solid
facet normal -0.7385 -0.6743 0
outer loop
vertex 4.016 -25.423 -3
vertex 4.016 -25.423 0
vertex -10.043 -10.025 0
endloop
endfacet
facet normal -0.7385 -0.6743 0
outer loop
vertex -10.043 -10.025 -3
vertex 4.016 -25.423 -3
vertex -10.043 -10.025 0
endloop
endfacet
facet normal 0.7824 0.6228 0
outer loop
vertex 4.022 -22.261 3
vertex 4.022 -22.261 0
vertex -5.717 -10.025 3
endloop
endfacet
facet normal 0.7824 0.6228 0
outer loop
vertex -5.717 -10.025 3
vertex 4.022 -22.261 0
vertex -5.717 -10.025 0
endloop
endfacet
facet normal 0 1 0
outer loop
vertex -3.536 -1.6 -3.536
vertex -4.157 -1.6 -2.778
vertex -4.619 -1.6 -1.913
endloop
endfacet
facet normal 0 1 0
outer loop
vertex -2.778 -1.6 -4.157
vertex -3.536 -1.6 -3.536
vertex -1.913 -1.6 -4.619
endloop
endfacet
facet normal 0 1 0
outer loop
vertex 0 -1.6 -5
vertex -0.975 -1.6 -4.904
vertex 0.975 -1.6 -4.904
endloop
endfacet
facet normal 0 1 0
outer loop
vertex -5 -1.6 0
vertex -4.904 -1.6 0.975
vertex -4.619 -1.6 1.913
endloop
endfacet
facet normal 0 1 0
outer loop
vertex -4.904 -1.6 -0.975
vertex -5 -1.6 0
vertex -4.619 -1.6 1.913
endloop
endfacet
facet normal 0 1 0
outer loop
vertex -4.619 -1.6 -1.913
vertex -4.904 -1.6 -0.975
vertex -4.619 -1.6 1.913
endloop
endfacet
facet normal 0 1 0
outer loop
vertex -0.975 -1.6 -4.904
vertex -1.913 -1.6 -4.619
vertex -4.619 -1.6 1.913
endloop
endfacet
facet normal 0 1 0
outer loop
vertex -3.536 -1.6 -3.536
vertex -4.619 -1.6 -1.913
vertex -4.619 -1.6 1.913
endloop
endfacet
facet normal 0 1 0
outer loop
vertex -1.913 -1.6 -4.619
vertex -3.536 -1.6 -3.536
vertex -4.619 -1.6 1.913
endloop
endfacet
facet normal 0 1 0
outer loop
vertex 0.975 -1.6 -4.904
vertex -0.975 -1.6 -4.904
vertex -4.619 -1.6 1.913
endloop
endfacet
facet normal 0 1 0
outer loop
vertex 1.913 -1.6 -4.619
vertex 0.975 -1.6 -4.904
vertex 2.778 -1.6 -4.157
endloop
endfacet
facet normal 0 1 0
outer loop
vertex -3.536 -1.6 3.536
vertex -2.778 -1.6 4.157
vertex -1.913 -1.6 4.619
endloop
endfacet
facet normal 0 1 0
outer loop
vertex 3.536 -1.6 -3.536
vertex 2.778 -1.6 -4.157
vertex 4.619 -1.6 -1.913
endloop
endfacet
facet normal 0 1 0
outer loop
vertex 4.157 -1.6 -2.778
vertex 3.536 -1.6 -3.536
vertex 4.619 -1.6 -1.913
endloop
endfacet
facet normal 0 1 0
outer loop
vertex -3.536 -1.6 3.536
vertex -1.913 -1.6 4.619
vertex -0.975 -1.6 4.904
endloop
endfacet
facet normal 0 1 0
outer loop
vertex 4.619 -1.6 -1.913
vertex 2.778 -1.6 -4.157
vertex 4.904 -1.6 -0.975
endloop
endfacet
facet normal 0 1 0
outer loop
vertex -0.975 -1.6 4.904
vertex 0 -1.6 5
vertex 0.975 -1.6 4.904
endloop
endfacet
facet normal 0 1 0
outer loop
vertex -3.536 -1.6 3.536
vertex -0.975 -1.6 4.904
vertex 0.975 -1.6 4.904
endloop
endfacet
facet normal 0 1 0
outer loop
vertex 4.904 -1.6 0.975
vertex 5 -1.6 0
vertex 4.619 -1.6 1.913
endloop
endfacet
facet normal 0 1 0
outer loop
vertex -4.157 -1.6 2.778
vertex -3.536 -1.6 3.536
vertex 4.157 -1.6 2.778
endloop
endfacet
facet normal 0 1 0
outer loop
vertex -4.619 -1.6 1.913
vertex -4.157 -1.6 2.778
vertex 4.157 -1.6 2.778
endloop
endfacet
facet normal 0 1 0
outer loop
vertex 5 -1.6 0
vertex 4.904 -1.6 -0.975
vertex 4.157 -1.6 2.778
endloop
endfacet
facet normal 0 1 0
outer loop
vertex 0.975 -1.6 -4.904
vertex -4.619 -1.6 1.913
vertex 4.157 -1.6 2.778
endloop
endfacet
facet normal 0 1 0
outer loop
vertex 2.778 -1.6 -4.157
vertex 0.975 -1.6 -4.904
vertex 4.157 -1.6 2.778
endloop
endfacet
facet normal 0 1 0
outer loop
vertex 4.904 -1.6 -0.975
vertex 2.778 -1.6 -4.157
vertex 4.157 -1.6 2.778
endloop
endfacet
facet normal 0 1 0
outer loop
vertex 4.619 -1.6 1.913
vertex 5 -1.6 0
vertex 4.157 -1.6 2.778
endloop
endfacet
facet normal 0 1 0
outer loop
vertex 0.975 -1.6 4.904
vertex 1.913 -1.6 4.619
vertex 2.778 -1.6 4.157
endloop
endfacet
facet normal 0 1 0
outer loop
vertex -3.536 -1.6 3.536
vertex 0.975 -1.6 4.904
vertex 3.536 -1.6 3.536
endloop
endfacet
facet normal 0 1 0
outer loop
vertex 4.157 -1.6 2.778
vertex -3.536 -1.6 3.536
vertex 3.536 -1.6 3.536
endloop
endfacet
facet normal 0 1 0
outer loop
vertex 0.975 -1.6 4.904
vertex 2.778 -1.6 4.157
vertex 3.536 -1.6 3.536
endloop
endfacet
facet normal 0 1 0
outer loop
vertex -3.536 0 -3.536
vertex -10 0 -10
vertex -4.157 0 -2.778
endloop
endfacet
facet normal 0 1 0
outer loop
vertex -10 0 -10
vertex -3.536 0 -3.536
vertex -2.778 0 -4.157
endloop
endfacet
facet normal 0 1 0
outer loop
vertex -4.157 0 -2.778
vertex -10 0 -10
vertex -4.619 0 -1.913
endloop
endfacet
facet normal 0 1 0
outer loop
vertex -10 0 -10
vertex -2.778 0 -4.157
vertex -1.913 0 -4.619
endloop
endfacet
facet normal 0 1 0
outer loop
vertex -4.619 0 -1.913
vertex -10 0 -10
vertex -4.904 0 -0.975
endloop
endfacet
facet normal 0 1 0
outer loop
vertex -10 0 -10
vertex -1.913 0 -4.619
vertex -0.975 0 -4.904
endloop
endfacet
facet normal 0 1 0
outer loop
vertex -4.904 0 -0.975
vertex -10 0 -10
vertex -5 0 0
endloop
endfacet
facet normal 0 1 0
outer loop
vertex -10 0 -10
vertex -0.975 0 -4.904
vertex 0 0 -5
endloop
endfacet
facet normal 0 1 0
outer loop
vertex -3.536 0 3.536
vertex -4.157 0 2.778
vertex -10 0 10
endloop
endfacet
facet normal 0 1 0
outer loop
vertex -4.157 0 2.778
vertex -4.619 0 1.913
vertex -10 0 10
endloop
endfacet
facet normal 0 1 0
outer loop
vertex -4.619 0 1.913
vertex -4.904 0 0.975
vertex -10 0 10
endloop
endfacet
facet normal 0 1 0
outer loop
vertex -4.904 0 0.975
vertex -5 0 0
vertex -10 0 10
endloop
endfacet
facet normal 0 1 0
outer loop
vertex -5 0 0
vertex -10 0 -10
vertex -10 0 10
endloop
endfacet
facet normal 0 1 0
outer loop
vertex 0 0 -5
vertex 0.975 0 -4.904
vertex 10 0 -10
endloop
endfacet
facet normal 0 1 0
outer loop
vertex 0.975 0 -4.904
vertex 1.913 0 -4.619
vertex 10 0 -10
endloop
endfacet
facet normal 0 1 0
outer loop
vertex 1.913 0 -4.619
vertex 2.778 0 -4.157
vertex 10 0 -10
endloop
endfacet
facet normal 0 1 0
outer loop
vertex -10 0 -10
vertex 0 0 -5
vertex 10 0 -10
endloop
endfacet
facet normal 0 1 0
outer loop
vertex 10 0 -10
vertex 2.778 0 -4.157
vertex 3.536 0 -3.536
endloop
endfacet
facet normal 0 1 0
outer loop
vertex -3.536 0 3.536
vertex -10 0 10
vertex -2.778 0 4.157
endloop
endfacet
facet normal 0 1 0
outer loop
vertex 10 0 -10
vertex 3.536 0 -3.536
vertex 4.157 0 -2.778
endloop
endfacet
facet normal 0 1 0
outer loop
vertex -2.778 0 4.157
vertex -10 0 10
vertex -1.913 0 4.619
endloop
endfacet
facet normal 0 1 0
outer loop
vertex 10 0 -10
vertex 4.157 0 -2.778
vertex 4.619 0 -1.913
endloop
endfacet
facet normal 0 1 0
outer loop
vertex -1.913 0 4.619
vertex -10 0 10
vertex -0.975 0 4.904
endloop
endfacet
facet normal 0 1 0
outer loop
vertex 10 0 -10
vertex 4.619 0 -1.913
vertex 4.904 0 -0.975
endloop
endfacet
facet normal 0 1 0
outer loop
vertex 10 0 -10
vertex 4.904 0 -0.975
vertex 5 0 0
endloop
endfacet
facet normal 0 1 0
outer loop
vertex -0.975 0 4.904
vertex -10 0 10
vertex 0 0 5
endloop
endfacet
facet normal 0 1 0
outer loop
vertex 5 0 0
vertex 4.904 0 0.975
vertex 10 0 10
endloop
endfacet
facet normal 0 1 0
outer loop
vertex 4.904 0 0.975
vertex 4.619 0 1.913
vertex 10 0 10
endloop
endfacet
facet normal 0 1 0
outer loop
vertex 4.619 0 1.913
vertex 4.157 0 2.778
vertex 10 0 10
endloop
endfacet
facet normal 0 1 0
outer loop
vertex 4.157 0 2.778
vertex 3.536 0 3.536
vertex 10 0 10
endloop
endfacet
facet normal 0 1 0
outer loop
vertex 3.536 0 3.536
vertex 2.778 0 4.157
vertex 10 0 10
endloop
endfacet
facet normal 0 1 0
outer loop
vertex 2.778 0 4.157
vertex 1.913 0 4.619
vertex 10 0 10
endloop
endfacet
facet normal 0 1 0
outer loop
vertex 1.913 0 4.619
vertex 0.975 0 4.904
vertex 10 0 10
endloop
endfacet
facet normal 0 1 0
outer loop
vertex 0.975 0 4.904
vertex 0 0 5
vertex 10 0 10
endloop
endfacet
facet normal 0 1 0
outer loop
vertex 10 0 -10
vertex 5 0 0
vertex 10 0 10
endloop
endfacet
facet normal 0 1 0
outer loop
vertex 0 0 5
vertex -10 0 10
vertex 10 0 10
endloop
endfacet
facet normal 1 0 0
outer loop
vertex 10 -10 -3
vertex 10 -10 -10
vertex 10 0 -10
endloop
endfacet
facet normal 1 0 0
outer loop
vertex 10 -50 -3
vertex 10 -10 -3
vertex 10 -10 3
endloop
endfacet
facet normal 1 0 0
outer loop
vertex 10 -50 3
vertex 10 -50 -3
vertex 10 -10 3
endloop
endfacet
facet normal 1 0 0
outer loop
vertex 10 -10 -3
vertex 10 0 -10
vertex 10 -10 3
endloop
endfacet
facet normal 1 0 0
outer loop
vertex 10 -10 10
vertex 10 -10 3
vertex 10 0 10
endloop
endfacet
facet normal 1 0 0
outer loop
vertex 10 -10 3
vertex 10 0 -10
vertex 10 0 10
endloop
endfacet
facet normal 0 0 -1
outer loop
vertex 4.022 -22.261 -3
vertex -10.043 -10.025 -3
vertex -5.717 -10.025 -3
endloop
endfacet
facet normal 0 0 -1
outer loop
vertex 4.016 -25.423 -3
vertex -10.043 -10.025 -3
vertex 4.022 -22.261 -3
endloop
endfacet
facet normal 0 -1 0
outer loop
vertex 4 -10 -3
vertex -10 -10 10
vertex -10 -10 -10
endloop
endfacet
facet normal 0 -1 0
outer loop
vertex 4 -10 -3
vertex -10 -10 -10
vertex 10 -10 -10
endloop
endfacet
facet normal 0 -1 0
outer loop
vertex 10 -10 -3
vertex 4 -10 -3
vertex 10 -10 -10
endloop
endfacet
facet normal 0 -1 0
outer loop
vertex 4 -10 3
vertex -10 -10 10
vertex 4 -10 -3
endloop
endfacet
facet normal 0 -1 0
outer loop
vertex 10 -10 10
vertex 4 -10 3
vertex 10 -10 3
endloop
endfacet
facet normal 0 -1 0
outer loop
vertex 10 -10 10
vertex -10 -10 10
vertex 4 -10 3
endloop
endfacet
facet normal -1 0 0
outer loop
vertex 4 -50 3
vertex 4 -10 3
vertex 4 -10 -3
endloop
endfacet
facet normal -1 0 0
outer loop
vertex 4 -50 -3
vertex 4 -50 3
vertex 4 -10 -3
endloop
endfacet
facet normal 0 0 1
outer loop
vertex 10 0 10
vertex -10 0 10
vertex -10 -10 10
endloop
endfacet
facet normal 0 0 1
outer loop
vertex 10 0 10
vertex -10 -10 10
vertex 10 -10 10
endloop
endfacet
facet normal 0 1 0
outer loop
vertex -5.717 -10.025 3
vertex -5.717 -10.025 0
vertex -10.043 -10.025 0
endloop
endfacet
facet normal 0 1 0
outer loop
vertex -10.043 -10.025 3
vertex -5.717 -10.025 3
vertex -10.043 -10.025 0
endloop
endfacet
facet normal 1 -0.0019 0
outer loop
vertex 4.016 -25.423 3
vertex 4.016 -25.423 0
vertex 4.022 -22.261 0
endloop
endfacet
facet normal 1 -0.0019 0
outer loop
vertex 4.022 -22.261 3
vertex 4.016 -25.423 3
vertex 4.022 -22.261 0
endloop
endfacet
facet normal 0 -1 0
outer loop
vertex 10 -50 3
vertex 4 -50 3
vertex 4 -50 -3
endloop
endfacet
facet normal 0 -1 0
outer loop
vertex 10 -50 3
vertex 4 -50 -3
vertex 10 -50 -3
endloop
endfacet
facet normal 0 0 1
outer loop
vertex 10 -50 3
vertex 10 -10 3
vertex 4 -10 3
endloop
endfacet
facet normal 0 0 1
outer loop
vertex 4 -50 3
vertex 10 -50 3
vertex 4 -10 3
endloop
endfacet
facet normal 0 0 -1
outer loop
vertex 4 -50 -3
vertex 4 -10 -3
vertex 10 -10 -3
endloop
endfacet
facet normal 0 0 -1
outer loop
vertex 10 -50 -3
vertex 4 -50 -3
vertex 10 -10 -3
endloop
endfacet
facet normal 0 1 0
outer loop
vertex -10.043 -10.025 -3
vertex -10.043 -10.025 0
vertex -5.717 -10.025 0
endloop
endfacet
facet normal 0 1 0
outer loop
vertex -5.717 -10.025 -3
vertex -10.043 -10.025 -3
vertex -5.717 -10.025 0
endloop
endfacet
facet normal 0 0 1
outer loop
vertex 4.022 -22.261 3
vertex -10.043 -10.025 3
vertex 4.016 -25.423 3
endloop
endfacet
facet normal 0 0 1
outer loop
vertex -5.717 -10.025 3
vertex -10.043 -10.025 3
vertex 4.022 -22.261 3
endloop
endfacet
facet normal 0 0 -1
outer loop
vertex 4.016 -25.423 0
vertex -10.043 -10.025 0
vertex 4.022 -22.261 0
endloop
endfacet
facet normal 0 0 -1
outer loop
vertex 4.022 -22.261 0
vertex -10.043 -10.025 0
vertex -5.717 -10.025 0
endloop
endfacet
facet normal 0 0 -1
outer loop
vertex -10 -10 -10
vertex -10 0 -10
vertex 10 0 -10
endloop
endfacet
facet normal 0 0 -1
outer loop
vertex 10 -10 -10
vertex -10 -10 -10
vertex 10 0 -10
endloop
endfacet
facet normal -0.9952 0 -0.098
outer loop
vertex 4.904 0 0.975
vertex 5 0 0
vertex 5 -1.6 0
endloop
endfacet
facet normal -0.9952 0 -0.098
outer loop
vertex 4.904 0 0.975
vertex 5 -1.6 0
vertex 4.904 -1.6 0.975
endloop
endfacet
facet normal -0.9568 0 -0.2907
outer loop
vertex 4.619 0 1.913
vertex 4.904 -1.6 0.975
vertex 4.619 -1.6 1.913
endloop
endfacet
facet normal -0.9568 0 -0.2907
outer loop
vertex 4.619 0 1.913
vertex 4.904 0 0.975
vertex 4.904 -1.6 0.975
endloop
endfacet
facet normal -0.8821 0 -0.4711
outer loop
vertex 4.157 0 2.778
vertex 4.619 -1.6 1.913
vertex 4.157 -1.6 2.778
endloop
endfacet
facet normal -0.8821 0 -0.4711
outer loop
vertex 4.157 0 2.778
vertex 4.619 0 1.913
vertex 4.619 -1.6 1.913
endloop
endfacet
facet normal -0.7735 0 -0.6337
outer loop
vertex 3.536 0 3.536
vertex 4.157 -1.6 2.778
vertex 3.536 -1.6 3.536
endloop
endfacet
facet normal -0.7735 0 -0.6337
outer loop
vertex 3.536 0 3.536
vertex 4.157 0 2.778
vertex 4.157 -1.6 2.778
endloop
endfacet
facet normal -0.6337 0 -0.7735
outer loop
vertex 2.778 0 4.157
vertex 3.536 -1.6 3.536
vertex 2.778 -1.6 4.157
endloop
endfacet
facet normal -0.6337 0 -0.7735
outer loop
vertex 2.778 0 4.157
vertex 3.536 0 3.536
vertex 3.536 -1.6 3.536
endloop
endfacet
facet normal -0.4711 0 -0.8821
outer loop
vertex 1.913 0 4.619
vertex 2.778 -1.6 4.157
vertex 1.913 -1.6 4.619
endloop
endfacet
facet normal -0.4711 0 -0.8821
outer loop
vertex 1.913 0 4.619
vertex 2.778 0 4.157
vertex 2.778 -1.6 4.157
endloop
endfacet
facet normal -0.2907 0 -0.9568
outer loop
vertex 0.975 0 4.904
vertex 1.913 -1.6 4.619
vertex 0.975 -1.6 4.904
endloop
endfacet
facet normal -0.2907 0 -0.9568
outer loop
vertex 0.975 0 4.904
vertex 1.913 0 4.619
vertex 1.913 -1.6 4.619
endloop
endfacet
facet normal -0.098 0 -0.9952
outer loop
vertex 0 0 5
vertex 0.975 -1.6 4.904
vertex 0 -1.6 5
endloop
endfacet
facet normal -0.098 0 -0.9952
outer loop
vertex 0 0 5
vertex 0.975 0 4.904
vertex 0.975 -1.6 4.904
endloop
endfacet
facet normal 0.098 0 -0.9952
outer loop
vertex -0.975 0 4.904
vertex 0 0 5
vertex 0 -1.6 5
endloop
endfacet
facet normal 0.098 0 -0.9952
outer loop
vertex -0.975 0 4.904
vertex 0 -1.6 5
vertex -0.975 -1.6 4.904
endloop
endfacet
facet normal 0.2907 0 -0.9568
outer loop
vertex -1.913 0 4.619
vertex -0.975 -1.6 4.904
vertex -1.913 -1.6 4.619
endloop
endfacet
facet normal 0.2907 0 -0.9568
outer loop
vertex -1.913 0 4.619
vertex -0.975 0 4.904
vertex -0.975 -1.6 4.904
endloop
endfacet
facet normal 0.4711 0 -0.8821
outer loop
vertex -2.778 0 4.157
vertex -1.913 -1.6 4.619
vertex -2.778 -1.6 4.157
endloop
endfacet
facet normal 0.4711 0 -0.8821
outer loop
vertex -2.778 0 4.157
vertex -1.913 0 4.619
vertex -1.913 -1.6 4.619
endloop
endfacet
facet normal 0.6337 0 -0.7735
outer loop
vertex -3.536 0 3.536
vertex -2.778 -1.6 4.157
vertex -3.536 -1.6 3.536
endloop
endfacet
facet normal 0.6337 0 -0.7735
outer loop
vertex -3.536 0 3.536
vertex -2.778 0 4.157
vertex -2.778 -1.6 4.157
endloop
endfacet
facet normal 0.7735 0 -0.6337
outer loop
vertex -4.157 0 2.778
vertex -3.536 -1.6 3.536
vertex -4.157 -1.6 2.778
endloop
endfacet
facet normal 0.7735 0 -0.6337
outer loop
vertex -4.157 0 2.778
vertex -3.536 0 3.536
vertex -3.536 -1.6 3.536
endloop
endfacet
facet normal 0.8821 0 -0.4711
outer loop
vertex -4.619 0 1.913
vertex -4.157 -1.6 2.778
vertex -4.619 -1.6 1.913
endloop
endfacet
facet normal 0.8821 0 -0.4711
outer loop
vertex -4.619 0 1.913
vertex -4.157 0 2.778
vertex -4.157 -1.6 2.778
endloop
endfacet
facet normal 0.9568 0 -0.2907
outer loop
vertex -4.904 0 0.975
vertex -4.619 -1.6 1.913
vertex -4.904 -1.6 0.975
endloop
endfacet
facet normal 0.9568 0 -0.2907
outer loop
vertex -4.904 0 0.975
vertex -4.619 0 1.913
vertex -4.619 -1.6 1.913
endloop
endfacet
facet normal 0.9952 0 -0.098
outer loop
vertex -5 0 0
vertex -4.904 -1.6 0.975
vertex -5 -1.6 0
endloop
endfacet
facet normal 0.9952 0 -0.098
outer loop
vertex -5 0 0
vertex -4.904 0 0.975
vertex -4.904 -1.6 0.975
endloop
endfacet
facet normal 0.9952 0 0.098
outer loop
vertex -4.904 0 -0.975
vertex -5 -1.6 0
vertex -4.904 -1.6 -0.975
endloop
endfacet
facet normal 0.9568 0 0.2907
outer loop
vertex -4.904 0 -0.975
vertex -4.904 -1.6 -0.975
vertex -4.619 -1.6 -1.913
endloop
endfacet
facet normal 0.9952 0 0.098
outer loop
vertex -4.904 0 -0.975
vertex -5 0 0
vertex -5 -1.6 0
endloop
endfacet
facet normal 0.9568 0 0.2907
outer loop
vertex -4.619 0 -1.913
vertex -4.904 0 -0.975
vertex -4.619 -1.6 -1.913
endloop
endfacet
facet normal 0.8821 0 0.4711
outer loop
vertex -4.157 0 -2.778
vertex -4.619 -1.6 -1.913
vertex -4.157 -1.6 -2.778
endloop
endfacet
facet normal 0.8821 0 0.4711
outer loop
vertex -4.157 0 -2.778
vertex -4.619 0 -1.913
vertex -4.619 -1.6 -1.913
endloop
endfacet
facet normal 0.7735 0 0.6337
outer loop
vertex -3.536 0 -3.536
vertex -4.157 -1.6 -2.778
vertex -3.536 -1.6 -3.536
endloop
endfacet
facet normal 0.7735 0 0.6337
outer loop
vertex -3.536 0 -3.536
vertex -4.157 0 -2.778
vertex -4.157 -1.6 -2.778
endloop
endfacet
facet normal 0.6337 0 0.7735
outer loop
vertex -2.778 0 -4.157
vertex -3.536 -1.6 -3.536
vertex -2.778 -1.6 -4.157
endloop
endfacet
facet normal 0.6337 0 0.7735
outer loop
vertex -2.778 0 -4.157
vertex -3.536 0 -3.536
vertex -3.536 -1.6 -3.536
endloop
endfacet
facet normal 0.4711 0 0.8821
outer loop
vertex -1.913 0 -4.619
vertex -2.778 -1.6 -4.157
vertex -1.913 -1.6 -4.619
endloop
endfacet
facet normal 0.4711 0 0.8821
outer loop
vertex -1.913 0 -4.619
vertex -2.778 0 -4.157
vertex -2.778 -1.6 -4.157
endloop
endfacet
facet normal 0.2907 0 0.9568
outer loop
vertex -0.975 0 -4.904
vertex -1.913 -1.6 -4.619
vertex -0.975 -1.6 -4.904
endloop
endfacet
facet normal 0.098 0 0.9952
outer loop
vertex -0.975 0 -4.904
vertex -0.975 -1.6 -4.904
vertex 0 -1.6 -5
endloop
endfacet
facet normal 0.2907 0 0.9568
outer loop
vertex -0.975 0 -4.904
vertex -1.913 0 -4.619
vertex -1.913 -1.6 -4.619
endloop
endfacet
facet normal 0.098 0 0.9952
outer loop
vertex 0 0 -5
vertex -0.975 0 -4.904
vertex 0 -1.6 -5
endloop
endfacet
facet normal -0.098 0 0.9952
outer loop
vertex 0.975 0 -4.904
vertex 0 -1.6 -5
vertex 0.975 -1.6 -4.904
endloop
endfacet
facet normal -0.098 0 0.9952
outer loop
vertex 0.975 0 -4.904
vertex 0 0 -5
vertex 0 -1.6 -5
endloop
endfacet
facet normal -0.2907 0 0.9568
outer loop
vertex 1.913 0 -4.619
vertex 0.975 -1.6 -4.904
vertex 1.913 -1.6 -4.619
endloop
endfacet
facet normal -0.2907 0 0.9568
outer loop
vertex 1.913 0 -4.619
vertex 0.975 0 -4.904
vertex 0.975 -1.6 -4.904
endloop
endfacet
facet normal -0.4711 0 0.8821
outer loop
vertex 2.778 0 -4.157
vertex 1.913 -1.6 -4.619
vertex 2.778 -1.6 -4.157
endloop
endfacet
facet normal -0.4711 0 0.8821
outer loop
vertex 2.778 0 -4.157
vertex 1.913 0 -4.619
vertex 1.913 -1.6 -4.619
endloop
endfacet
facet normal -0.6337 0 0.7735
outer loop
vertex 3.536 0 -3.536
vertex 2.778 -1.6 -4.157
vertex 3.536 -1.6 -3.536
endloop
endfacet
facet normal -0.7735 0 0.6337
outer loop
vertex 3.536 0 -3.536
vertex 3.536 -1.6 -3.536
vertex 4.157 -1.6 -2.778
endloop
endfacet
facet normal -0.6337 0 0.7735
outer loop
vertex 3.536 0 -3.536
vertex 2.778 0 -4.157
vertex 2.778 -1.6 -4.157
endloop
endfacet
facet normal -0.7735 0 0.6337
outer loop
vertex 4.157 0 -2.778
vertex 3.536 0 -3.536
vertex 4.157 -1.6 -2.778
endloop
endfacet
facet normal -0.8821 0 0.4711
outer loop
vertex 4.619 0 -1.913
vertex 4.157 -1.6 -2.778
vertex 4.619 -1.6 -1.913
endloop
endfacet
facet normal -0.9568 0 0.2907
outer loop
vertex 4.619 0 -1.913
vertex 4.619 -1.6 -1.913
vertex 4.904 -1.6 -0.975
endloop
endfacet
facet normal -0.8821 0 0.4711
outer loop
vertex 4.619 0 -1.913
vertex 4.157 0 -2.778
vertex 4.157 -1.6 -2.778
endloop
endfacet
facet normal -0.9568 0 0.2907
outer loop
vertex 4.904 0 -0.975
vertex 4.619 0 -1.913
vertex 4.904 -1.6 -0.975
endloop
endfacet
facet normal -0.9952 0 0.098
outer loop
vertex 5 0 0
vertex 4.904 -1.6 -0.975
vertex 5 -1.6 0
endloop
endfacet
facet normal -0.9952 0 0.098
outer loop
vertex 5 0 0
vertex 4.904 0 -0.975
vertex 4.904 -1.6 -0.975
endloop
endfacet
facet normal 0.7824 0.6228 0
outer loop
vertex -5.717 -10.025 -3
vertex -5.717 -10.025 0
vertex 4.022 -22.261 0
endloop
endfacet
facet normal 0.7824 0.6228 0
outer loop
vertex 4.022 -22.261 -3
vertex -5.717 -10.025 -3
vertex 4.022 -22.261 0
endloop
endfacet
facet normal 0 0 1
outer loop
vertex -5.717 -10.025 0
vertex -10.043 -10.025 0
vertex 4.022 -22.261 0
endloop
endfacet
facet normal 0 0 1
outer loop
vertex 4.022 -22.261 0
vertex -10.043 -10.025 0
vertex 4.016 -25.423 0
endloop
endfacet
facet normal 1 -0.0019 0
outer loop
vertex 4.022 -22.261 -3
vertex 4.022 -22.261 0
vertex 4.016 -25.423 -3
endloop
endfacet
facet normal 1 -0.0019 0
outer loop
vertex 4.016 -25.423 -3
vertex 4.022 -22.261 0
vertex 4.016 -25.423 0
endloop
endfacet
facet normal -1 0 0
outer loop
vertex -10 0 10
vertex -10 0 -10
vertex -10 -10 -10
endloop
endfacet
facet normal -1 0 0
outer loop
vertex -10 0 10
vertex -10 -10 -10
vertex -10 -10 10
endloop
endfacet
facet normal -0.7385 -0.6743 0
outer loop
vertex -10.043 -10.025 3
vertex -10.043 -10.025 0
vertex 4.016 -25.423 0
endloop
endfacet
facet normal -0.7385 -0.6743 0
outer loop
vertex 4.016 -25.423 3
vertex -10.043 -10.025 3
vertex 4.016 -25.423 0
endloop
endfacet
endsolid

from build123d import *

# Parameters (mm, degrees)
F0_W     = 20
F0_H     = 20
F1_DEPTH = 10
F2_R     = 5
F3_DEPTH = 1.6
F5_DEPTH = 40
F7_DEPTH = 3
F8_DEPTH = 3


with BuildPart() as f1:
    # F0 (on Front) → F1 (new body)
    with BuildSketch(Plane.XZ):
        Rectangle(F0_W, F0_H)
    extrude(amount=F1_DEPTH)

    # F2 (on Front) → F3 (cut)
    with BuildSketch(Plane.XZ):
        Circle(F2_R)
    extrude(amount=F3_DEPTH, mode=Mode.SUBTRACT)

    # F4 (on face) → F5 (join)
    with BuildSketch(Plane.XZ.offset(10)):
        Polygon((10, -3), (10, 0), (10, 3), (4, 3), (4, -3), align=None)
    extrude(amount=F5_DEPTH)


with BuildPart() as f7:
    # F6 (on Top) → F7 (new body)
    with BuildSketch(Plane.XY):
        Polygon((4.015921, -25.42335), (4.022068, -22.261256), (-5.716987, -10.025485), (-10.042533, -10.025485), align=None)
    extrude(amount=F7_DEPTH)


with BuildPart() as f8:
    # F7_face (on face) → F8 (new body)
    with BuildSketch(Plane(origin=(-2.42975, -16.449823, 0), x_dir=(1, 0, 0), z_dir=(0, 0, -1))):
        Polygon((-7.612783, -6.424337), (-3.287238, -6.424337), (6.451818, 5.811434), (6.445671, 8.973527), align=None)
    extrude(amount=F8_DEPTH)


solid = Compound([f1.part, f7.part, f8.part])
